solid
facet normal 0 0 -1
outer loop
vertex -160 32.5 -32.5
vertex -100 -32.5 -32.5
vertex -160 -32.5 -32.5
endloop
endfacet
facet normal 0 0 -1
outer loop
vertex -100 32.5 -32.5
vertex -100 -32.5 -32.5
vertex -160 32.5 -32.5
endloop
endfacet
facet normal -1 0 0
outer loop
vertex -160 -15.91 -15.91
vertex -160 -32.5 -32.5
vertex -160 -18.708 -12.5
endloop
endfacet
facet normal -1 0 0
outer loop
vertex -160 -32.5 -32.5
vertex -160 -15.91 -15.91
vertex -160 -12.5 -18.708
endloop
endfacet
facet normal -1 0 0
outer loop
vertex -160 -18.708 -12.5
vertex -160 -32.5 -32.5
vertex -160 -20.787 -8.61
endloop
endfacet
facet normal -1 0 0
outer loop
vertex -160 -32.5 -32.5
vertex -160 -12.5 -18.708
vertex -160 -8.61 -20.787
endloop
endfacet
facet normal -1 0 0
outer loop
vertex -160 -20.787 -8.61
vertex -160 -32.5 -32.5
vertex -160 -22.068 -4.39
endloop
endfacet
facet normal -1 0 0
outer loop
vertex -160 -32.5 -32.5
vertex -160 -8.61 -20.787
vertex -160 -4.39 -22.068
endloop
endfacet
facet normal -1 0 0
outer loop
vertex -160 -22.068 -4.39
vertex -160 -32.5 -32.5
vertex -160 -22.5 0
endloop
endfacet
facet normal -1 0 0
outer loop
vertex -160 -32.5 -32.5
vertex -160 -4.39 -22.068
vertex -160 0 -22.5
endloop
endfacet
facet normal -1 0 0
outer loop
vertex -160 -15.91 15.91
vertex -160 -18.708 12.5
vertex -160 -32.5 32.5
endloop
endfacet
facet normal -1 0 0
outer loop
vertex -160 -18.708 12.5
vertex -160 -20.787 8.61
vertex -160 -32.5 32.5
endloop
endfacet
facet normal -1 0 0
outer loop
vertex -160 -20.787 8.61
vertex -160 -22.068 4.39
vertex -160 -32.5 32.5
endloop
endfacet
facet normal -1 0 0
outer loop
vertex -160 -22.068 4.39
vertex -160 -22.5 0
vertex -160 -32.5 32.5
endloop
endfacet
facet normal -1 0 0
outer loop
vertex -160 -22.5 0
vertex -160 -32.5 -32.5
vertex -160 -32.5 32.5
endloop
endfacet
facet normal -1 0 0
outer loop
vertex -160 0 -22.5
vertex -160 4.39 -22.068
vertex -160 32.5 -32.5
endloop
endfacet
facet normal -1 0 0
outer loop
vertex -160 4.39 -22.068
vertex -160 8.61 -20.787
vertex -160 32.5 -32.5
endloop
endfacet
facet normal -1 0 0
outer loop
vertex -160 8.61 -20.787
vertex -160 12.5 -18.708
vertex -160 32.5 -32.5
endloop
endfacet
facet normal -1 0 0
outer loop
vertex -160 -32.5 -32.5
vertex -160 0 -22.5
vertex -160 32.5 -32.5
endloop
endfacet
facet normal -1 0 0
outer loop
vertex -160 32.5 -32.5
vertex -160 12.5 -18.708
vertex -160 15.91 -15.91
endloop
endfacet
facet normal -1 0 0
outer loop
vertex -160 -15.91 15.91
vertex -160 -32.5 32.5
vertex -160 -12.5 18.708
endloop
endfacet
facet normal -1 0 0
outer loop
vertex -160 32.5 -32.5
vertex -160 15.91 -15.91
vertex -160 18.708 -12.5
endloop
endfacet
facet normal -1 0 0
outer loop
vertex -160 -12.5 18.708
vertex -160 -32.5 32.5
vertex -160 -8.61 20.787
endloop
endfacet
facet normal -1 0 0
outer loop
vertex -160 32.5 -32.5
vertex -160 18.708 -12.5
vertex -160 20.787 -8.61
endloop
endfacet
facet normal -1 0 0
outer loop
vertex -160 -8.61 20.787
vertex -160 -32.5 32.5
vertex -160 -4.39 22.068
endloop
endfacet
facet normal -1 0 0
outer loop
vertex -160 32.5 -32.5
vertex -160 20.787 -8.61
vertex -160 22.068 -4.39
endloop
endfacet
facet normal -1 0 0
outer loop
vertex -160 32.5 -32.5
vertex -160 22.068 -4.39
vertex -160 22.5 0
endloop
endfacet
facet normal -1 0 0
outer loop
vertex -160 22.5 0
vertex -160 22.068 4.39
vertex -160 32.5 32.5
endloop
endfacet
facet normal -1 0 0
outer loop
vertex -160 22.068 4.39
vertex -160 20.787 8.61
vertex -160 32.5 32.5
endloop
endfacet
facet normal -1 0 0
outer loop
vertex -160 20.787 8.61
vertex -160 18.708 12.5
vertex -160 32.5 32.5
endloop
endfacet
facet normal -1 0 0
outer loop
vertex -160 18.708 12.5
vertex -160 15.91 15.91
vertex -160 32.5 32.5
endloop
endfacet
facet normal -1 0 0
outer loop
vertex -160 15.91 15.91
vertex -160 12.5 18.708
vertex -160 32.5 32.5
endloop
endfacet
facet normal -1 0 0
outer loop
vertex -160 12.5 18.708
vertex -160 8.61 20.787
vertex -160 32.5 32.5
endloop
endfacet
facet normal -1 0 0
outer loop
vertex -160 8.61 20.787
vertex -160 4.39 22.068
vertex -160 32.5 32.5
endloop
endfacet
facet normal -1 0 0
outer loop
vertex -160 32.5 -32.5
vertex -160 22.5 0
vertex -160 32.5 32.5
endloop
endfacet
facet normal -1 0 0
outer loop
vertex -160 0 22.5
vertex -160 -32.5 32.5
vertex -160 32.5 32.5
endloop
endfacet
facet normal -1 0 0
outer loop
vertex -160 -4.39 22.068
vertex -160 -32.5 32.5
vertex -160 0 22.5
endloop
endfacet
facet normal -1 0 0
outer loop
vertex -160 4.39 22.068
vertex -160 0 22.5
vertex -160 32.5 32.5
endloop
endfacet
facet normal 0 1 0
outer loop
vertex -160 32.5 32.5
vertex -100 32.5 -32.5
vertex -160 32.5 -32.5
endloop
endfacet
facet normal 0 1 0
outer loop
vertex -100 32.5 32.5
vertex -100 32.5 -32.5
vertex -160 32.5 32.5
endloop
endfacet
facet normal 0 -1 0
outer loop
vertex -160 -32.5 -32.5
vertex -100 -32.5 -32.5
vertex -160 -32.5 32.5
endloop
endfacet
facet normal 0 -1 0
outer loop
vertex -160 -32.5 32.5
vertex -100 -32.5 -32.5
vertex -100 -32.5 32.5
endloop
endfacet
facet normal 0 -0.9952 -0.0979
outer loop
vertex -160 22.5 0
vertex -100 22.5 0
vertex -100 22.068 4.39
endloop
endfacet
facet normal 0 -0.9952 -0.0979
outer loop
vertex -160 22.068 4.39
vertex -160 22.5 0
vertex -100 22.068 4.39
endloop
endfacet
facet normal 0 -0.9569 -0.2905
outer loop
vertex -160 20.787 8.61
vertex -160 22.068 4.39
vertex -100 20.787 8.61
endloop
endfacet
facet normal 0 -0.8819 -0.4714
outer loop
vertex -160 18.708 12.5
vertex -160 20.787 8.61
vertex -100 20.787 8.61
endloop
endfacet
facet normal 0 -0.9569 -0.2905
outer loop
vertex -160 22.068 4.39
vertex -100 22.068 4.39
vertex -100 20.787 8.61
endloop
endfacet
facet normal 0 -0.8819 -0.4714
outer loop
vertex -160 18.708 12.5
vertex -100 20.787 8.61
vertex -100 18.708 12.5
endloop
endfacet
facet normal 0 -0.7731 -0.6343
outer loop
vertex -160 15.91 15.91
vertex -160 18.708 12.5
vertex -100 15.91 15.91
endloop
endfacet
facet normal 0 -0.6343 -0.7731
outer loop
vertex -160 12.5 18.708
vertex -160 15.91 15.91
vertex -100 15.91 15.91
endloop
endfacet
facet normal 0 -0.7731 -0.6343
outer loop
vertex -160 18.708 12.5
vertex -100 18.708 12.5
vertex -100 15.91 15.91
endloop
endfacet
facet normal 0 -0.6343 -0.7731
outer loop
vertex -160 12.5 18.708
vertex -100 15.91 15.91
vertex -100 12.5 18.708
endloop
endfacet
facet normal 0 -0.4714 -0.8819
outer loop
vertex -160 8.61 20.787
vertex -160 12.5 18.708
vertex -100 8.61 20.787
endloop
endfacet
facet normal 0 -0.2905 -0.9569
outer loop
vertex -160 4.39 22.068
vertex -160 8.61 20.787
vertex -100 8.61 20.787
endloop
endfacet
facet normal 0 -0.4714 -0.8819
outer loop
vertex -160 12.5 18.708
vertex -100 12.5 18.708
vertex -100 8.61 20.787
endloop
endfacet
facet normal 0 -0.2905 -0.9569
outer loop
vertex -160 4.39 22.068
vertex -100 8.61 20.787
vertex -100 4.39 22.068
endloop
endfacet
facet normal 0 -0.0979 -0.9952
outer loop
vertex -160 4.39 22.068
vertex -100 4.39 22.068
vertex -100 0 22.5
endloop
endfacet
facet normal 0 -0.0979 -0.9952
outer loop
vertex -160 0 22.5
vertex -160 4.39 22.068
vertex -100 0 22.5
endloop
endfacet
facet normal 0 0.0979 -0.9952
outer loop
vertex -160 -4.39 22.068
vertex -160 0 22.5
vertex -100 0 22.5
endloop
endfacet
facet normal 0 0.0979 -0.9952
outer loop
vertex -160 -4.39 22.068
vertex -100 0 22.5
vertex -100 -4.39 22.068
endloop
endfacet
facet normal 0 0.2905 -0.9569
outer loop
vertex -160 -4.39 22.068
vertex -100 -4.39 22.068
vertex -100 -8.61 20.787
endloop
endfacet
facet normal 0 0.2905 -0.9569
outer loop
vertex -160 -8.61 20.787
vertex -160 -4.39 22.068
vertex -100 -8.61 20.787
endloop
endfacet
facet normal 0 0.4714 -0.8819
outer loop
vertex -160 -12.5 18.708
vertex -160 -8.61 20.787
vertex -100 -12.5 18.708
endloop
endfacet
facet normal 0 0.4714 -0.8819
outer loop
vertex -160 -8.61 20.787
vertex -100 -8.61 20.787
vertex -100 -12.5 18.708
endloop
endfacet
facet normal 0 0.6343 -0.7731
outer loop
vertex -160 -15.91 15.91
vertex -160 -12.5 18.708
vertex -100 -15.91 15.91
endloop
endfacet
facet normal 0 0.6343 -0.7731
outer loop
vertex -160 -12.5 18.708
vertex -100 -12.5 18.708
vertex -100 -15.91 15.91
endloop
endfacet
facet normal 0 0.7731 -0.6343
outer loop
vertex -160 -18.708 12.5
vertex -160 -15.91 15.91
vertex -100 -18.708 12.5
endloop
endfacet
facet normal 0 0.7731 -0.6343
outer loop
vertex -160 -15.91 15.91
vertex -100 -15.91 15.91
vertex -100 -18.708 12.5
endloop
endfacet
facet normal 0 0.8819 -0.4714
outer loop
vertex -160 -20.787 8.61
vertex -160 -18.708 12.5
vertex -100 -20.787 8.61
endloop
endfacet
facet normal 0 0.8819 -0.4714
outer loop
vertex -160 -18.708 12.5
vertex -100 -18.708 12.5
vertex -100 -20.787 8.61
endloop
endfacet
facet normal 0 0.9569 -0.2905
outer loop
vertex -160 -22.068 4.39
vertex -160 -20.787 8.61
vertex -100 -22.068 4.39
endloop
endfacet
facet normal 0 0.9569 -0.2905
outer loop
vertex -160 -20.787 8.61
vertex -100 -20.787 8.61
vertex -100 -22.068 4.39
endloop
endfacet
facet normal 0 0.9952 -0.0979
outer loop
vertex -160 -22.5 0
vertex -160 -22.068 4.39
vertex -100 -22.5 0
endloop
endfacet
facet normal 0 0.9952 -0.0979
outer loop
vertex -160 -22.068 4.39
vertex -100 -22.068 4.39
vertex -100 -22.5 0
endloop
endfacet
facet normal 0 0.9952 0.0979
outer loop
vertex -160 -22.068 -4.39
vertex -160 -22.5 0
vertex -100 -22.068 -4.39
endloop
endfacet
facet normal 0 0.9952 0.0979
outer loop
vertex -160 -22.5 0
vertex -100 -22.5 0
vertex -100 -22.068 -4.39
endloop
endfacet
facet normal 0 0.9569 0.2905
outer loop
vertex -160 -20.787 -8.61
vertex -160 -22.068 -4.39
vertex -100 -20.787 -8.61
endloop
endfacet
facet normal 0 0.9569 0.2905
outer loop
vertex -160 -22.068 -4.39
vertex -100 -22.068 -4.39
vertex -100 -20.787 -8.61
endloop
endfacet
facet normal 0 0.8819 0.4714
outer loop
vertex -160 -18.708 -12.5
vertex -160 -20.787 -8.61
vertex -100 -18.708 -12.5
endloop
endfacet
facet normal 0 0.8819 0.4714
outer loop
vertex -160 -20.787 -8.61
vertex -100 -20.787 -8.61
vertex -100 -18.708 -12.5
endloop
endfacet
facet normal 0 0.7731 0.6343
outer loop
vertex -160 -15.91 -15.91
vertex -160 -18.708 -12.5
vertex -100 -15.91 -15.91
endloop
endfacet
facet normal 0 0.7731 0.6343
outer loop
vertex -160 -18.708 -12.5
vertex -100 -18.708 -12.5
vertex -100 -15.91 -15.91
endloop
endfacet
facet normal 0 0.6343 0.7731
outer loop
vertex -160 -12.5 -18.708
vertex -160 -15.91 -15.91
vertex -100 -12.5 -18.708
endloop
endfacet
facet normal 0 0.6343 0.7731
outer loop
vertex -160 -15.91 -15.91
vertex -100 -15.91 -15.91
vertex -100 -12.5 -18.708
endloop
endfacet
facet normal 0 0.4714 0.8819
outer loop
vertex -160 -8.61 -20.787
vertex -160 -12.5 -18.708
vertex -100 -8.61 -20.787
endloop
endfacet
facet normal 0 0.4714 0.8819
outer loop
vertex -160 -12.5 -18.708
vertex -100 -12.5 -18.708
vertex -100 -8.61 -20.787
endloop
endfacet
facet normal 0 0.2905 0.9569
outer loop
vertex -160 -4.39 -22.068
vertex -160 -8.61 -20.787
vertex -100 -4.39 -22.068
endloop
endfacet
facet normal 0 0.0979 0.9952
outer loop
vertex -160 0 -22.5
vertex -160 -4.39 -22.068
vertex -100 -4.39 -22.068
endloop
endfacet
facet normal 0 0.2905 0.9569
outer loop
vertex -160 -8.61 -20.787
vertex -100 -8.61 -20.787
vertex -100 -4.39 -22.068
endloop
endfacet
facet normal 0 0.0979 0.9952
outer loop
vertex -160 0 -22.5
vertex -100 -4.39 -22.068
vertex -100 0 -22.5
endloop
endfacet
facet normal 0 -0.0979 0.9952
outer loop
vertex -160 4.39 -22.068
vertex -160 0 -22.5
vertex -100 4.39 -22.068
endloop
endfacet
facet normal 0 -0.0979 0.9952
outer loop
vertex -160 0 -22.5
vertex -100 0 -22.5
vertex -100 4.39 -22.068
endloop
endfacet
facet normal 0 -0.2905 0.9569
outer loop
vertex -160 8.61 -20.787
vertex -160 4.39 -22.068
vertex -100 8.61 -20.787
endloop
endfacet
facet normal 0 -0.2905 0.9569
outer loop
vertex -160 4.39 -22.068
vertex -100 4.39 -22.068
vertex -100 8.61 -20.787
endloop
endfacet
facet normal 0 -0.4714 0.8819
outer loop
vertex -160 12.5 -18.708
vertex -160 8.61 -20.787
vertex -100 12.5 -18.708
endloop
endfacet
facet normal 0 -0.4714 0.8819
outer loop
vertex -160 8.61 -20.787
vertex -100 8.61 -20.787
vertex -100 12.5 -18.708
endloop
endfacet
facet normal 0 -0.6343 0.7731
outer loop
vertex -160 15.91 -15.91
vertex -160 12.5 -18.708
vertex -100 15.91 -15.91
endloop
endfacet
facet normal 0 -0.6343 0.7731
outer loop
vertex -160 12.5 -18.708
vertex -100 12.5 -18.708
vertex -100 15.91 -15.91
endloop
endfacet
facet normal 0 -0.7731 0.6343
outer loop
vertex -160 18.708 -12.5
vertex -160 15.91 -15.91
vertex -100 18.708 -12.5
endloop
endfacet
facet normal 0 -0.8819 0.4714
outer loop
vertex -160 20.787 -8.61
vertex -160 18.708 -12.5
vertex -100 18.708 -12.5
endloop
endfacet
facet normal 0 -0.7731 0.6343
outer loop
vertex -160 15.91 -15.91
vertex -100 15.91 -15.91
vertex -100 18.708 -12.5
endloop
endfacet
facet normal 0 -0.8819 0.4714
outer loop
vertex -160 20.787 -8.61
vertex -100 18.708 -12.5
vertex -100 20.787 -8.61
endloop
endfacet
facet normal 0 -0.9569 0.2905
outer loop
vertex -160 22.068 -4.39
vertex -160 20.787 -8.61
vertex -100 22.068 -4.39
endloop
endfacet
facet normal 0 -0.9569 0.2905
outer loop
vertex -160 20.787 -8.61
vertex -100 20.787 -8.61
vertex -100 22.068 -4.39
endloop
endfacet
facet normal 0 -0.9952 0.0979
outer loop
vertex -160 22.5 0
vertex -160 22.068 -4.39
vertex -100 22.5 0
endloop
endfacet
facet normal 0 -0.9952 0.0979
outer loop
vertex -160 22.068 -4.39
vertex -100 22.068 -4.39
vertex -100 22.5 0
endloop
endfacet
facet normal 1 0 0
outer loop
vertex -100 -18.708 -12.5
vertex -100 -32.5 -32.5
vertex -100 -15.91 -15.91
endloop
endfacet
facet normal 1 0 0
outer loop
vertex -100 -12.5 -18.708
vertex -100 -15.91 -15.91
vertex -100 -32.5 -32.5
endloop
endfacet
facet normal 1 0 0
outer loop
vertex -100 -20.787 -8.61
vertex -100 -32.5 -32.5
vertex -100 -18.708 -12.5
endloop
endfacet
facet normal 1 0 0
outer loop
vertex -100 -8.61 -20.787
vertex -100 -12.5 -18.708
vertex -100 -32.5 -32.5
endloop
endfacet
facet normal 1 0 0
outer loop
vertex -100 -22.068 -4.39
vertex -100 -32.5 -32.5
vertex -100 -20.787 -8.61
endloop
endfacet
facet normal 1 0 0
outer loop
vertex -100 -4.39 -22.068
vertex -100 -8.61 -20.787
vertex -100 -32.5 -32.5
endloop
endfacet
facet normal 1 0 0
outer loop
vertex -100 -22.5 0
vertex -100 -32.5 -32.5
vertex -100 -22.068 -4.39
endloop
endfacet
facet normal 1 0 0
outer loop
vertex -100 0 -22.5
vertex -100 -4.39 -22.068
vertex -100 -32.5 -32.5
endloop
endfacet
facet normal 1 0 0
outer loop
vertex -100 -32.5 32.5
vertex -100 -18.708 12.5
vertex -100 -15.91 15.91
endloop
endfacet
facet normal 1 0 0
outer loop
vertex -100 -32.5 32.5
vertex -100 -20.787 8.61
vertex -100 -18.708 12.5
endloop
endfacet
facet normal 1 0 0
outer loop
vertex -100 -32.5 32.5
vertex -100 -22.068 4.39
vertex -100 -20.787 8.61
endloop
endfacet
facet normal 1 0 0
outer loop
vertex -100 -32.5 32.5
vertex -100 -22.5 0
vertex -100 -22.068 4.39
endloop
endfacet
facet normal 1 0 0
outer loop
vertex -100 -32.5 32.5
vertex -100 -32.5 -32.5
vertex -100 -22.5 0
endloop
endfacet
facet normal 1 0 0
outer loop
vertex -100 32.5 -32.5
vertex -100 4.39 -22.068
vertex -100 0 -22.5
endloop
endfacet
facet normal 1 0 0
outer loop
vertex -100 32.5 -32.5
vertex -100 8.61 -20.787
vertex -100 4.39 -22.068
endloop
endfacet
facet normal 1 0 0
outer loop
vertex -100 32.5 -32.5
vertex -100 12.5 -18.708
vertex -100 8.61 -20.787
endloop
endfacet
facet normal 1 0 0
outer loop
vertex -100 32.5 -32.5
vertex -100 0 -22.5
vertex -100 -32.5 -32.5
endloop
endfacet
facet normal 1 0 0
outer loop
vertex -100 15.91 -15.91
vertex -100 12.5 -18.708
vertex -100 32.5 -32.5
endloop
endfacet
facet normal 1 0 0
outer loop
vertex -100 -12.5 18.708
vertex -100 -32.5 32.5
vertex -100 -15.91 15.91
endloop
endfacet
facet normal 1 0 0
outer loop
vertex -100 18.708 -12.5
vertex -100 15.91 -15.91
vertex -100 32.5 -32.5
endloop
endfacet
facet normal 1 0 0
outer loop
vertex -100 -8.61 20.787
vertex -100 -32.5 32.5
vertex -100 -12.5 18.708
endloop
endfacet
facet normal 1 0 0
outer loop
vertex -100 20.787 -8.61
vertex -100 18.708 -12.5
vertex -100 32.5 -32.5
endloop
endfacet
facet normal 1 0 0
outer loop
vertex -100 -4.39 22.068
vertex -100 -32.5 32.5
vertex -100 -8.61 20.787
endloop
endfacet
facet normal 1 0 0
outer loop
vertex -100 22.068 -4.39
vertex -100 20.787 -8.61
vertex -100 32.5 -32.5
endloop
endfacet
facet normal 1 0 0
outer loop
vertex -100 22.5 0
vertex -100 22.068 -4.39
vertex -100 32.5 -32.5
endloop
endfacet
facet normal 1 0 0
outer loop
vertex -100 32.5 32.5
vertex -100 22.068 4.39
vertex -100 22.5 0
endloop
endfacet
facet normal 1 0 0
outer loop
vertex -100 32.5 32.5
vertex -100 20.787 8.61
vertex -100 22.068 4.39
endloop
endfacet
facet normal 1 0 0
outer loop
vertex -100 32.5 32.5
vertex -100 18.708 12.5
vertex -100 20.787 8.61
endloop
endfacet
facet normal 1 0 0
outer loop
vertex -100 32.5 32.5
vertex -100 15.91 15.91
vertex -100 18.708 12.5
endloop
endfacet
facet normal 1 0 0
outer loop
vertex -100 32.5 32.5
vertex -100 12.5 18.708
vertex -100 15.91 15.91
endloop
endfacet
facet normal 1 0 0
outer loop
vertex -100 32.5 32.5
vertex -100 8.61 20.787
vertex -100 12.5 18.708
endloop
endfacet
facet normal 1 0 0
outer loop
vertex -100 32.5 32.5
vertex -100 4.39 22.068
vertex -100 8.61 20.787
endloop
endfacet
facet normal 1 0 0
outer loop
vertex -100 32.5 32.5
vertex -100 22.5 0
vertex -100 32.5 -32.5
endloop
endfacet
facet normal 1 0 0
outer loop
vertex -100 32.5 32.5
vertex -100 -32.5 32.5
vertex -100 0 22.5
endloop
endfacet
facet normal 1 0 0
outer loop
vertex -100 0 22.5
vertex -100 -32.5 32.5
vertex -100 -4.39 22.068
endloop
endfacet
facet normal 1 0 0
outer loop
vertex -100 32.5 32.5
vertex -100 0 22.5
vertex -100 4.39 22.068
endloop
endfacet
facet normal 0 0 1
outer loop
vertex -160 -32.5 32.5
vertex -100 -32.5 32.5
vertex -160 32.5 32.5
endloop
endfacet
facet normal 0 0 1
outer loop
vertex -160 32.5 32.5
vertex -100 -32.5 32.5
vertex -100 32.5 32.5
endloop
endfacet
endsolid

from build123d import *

# Parameters (mm, degrees)
F1_W     = 65
F1_H     = 65
F1_R     = 22.5
F2_DEPTH = 60


with BuildPart() as f2:
    # F1 (on offset) → F2 (new body)
    with BuildSketch(Plane.YZ.offset(-100)):
        Rectangle(F1_W, F1_H)
        Circle(F1_R, mode=Mode.SUBTRACT)
    extrude(amount=-F2_DEPTH)


solid = f2.part
